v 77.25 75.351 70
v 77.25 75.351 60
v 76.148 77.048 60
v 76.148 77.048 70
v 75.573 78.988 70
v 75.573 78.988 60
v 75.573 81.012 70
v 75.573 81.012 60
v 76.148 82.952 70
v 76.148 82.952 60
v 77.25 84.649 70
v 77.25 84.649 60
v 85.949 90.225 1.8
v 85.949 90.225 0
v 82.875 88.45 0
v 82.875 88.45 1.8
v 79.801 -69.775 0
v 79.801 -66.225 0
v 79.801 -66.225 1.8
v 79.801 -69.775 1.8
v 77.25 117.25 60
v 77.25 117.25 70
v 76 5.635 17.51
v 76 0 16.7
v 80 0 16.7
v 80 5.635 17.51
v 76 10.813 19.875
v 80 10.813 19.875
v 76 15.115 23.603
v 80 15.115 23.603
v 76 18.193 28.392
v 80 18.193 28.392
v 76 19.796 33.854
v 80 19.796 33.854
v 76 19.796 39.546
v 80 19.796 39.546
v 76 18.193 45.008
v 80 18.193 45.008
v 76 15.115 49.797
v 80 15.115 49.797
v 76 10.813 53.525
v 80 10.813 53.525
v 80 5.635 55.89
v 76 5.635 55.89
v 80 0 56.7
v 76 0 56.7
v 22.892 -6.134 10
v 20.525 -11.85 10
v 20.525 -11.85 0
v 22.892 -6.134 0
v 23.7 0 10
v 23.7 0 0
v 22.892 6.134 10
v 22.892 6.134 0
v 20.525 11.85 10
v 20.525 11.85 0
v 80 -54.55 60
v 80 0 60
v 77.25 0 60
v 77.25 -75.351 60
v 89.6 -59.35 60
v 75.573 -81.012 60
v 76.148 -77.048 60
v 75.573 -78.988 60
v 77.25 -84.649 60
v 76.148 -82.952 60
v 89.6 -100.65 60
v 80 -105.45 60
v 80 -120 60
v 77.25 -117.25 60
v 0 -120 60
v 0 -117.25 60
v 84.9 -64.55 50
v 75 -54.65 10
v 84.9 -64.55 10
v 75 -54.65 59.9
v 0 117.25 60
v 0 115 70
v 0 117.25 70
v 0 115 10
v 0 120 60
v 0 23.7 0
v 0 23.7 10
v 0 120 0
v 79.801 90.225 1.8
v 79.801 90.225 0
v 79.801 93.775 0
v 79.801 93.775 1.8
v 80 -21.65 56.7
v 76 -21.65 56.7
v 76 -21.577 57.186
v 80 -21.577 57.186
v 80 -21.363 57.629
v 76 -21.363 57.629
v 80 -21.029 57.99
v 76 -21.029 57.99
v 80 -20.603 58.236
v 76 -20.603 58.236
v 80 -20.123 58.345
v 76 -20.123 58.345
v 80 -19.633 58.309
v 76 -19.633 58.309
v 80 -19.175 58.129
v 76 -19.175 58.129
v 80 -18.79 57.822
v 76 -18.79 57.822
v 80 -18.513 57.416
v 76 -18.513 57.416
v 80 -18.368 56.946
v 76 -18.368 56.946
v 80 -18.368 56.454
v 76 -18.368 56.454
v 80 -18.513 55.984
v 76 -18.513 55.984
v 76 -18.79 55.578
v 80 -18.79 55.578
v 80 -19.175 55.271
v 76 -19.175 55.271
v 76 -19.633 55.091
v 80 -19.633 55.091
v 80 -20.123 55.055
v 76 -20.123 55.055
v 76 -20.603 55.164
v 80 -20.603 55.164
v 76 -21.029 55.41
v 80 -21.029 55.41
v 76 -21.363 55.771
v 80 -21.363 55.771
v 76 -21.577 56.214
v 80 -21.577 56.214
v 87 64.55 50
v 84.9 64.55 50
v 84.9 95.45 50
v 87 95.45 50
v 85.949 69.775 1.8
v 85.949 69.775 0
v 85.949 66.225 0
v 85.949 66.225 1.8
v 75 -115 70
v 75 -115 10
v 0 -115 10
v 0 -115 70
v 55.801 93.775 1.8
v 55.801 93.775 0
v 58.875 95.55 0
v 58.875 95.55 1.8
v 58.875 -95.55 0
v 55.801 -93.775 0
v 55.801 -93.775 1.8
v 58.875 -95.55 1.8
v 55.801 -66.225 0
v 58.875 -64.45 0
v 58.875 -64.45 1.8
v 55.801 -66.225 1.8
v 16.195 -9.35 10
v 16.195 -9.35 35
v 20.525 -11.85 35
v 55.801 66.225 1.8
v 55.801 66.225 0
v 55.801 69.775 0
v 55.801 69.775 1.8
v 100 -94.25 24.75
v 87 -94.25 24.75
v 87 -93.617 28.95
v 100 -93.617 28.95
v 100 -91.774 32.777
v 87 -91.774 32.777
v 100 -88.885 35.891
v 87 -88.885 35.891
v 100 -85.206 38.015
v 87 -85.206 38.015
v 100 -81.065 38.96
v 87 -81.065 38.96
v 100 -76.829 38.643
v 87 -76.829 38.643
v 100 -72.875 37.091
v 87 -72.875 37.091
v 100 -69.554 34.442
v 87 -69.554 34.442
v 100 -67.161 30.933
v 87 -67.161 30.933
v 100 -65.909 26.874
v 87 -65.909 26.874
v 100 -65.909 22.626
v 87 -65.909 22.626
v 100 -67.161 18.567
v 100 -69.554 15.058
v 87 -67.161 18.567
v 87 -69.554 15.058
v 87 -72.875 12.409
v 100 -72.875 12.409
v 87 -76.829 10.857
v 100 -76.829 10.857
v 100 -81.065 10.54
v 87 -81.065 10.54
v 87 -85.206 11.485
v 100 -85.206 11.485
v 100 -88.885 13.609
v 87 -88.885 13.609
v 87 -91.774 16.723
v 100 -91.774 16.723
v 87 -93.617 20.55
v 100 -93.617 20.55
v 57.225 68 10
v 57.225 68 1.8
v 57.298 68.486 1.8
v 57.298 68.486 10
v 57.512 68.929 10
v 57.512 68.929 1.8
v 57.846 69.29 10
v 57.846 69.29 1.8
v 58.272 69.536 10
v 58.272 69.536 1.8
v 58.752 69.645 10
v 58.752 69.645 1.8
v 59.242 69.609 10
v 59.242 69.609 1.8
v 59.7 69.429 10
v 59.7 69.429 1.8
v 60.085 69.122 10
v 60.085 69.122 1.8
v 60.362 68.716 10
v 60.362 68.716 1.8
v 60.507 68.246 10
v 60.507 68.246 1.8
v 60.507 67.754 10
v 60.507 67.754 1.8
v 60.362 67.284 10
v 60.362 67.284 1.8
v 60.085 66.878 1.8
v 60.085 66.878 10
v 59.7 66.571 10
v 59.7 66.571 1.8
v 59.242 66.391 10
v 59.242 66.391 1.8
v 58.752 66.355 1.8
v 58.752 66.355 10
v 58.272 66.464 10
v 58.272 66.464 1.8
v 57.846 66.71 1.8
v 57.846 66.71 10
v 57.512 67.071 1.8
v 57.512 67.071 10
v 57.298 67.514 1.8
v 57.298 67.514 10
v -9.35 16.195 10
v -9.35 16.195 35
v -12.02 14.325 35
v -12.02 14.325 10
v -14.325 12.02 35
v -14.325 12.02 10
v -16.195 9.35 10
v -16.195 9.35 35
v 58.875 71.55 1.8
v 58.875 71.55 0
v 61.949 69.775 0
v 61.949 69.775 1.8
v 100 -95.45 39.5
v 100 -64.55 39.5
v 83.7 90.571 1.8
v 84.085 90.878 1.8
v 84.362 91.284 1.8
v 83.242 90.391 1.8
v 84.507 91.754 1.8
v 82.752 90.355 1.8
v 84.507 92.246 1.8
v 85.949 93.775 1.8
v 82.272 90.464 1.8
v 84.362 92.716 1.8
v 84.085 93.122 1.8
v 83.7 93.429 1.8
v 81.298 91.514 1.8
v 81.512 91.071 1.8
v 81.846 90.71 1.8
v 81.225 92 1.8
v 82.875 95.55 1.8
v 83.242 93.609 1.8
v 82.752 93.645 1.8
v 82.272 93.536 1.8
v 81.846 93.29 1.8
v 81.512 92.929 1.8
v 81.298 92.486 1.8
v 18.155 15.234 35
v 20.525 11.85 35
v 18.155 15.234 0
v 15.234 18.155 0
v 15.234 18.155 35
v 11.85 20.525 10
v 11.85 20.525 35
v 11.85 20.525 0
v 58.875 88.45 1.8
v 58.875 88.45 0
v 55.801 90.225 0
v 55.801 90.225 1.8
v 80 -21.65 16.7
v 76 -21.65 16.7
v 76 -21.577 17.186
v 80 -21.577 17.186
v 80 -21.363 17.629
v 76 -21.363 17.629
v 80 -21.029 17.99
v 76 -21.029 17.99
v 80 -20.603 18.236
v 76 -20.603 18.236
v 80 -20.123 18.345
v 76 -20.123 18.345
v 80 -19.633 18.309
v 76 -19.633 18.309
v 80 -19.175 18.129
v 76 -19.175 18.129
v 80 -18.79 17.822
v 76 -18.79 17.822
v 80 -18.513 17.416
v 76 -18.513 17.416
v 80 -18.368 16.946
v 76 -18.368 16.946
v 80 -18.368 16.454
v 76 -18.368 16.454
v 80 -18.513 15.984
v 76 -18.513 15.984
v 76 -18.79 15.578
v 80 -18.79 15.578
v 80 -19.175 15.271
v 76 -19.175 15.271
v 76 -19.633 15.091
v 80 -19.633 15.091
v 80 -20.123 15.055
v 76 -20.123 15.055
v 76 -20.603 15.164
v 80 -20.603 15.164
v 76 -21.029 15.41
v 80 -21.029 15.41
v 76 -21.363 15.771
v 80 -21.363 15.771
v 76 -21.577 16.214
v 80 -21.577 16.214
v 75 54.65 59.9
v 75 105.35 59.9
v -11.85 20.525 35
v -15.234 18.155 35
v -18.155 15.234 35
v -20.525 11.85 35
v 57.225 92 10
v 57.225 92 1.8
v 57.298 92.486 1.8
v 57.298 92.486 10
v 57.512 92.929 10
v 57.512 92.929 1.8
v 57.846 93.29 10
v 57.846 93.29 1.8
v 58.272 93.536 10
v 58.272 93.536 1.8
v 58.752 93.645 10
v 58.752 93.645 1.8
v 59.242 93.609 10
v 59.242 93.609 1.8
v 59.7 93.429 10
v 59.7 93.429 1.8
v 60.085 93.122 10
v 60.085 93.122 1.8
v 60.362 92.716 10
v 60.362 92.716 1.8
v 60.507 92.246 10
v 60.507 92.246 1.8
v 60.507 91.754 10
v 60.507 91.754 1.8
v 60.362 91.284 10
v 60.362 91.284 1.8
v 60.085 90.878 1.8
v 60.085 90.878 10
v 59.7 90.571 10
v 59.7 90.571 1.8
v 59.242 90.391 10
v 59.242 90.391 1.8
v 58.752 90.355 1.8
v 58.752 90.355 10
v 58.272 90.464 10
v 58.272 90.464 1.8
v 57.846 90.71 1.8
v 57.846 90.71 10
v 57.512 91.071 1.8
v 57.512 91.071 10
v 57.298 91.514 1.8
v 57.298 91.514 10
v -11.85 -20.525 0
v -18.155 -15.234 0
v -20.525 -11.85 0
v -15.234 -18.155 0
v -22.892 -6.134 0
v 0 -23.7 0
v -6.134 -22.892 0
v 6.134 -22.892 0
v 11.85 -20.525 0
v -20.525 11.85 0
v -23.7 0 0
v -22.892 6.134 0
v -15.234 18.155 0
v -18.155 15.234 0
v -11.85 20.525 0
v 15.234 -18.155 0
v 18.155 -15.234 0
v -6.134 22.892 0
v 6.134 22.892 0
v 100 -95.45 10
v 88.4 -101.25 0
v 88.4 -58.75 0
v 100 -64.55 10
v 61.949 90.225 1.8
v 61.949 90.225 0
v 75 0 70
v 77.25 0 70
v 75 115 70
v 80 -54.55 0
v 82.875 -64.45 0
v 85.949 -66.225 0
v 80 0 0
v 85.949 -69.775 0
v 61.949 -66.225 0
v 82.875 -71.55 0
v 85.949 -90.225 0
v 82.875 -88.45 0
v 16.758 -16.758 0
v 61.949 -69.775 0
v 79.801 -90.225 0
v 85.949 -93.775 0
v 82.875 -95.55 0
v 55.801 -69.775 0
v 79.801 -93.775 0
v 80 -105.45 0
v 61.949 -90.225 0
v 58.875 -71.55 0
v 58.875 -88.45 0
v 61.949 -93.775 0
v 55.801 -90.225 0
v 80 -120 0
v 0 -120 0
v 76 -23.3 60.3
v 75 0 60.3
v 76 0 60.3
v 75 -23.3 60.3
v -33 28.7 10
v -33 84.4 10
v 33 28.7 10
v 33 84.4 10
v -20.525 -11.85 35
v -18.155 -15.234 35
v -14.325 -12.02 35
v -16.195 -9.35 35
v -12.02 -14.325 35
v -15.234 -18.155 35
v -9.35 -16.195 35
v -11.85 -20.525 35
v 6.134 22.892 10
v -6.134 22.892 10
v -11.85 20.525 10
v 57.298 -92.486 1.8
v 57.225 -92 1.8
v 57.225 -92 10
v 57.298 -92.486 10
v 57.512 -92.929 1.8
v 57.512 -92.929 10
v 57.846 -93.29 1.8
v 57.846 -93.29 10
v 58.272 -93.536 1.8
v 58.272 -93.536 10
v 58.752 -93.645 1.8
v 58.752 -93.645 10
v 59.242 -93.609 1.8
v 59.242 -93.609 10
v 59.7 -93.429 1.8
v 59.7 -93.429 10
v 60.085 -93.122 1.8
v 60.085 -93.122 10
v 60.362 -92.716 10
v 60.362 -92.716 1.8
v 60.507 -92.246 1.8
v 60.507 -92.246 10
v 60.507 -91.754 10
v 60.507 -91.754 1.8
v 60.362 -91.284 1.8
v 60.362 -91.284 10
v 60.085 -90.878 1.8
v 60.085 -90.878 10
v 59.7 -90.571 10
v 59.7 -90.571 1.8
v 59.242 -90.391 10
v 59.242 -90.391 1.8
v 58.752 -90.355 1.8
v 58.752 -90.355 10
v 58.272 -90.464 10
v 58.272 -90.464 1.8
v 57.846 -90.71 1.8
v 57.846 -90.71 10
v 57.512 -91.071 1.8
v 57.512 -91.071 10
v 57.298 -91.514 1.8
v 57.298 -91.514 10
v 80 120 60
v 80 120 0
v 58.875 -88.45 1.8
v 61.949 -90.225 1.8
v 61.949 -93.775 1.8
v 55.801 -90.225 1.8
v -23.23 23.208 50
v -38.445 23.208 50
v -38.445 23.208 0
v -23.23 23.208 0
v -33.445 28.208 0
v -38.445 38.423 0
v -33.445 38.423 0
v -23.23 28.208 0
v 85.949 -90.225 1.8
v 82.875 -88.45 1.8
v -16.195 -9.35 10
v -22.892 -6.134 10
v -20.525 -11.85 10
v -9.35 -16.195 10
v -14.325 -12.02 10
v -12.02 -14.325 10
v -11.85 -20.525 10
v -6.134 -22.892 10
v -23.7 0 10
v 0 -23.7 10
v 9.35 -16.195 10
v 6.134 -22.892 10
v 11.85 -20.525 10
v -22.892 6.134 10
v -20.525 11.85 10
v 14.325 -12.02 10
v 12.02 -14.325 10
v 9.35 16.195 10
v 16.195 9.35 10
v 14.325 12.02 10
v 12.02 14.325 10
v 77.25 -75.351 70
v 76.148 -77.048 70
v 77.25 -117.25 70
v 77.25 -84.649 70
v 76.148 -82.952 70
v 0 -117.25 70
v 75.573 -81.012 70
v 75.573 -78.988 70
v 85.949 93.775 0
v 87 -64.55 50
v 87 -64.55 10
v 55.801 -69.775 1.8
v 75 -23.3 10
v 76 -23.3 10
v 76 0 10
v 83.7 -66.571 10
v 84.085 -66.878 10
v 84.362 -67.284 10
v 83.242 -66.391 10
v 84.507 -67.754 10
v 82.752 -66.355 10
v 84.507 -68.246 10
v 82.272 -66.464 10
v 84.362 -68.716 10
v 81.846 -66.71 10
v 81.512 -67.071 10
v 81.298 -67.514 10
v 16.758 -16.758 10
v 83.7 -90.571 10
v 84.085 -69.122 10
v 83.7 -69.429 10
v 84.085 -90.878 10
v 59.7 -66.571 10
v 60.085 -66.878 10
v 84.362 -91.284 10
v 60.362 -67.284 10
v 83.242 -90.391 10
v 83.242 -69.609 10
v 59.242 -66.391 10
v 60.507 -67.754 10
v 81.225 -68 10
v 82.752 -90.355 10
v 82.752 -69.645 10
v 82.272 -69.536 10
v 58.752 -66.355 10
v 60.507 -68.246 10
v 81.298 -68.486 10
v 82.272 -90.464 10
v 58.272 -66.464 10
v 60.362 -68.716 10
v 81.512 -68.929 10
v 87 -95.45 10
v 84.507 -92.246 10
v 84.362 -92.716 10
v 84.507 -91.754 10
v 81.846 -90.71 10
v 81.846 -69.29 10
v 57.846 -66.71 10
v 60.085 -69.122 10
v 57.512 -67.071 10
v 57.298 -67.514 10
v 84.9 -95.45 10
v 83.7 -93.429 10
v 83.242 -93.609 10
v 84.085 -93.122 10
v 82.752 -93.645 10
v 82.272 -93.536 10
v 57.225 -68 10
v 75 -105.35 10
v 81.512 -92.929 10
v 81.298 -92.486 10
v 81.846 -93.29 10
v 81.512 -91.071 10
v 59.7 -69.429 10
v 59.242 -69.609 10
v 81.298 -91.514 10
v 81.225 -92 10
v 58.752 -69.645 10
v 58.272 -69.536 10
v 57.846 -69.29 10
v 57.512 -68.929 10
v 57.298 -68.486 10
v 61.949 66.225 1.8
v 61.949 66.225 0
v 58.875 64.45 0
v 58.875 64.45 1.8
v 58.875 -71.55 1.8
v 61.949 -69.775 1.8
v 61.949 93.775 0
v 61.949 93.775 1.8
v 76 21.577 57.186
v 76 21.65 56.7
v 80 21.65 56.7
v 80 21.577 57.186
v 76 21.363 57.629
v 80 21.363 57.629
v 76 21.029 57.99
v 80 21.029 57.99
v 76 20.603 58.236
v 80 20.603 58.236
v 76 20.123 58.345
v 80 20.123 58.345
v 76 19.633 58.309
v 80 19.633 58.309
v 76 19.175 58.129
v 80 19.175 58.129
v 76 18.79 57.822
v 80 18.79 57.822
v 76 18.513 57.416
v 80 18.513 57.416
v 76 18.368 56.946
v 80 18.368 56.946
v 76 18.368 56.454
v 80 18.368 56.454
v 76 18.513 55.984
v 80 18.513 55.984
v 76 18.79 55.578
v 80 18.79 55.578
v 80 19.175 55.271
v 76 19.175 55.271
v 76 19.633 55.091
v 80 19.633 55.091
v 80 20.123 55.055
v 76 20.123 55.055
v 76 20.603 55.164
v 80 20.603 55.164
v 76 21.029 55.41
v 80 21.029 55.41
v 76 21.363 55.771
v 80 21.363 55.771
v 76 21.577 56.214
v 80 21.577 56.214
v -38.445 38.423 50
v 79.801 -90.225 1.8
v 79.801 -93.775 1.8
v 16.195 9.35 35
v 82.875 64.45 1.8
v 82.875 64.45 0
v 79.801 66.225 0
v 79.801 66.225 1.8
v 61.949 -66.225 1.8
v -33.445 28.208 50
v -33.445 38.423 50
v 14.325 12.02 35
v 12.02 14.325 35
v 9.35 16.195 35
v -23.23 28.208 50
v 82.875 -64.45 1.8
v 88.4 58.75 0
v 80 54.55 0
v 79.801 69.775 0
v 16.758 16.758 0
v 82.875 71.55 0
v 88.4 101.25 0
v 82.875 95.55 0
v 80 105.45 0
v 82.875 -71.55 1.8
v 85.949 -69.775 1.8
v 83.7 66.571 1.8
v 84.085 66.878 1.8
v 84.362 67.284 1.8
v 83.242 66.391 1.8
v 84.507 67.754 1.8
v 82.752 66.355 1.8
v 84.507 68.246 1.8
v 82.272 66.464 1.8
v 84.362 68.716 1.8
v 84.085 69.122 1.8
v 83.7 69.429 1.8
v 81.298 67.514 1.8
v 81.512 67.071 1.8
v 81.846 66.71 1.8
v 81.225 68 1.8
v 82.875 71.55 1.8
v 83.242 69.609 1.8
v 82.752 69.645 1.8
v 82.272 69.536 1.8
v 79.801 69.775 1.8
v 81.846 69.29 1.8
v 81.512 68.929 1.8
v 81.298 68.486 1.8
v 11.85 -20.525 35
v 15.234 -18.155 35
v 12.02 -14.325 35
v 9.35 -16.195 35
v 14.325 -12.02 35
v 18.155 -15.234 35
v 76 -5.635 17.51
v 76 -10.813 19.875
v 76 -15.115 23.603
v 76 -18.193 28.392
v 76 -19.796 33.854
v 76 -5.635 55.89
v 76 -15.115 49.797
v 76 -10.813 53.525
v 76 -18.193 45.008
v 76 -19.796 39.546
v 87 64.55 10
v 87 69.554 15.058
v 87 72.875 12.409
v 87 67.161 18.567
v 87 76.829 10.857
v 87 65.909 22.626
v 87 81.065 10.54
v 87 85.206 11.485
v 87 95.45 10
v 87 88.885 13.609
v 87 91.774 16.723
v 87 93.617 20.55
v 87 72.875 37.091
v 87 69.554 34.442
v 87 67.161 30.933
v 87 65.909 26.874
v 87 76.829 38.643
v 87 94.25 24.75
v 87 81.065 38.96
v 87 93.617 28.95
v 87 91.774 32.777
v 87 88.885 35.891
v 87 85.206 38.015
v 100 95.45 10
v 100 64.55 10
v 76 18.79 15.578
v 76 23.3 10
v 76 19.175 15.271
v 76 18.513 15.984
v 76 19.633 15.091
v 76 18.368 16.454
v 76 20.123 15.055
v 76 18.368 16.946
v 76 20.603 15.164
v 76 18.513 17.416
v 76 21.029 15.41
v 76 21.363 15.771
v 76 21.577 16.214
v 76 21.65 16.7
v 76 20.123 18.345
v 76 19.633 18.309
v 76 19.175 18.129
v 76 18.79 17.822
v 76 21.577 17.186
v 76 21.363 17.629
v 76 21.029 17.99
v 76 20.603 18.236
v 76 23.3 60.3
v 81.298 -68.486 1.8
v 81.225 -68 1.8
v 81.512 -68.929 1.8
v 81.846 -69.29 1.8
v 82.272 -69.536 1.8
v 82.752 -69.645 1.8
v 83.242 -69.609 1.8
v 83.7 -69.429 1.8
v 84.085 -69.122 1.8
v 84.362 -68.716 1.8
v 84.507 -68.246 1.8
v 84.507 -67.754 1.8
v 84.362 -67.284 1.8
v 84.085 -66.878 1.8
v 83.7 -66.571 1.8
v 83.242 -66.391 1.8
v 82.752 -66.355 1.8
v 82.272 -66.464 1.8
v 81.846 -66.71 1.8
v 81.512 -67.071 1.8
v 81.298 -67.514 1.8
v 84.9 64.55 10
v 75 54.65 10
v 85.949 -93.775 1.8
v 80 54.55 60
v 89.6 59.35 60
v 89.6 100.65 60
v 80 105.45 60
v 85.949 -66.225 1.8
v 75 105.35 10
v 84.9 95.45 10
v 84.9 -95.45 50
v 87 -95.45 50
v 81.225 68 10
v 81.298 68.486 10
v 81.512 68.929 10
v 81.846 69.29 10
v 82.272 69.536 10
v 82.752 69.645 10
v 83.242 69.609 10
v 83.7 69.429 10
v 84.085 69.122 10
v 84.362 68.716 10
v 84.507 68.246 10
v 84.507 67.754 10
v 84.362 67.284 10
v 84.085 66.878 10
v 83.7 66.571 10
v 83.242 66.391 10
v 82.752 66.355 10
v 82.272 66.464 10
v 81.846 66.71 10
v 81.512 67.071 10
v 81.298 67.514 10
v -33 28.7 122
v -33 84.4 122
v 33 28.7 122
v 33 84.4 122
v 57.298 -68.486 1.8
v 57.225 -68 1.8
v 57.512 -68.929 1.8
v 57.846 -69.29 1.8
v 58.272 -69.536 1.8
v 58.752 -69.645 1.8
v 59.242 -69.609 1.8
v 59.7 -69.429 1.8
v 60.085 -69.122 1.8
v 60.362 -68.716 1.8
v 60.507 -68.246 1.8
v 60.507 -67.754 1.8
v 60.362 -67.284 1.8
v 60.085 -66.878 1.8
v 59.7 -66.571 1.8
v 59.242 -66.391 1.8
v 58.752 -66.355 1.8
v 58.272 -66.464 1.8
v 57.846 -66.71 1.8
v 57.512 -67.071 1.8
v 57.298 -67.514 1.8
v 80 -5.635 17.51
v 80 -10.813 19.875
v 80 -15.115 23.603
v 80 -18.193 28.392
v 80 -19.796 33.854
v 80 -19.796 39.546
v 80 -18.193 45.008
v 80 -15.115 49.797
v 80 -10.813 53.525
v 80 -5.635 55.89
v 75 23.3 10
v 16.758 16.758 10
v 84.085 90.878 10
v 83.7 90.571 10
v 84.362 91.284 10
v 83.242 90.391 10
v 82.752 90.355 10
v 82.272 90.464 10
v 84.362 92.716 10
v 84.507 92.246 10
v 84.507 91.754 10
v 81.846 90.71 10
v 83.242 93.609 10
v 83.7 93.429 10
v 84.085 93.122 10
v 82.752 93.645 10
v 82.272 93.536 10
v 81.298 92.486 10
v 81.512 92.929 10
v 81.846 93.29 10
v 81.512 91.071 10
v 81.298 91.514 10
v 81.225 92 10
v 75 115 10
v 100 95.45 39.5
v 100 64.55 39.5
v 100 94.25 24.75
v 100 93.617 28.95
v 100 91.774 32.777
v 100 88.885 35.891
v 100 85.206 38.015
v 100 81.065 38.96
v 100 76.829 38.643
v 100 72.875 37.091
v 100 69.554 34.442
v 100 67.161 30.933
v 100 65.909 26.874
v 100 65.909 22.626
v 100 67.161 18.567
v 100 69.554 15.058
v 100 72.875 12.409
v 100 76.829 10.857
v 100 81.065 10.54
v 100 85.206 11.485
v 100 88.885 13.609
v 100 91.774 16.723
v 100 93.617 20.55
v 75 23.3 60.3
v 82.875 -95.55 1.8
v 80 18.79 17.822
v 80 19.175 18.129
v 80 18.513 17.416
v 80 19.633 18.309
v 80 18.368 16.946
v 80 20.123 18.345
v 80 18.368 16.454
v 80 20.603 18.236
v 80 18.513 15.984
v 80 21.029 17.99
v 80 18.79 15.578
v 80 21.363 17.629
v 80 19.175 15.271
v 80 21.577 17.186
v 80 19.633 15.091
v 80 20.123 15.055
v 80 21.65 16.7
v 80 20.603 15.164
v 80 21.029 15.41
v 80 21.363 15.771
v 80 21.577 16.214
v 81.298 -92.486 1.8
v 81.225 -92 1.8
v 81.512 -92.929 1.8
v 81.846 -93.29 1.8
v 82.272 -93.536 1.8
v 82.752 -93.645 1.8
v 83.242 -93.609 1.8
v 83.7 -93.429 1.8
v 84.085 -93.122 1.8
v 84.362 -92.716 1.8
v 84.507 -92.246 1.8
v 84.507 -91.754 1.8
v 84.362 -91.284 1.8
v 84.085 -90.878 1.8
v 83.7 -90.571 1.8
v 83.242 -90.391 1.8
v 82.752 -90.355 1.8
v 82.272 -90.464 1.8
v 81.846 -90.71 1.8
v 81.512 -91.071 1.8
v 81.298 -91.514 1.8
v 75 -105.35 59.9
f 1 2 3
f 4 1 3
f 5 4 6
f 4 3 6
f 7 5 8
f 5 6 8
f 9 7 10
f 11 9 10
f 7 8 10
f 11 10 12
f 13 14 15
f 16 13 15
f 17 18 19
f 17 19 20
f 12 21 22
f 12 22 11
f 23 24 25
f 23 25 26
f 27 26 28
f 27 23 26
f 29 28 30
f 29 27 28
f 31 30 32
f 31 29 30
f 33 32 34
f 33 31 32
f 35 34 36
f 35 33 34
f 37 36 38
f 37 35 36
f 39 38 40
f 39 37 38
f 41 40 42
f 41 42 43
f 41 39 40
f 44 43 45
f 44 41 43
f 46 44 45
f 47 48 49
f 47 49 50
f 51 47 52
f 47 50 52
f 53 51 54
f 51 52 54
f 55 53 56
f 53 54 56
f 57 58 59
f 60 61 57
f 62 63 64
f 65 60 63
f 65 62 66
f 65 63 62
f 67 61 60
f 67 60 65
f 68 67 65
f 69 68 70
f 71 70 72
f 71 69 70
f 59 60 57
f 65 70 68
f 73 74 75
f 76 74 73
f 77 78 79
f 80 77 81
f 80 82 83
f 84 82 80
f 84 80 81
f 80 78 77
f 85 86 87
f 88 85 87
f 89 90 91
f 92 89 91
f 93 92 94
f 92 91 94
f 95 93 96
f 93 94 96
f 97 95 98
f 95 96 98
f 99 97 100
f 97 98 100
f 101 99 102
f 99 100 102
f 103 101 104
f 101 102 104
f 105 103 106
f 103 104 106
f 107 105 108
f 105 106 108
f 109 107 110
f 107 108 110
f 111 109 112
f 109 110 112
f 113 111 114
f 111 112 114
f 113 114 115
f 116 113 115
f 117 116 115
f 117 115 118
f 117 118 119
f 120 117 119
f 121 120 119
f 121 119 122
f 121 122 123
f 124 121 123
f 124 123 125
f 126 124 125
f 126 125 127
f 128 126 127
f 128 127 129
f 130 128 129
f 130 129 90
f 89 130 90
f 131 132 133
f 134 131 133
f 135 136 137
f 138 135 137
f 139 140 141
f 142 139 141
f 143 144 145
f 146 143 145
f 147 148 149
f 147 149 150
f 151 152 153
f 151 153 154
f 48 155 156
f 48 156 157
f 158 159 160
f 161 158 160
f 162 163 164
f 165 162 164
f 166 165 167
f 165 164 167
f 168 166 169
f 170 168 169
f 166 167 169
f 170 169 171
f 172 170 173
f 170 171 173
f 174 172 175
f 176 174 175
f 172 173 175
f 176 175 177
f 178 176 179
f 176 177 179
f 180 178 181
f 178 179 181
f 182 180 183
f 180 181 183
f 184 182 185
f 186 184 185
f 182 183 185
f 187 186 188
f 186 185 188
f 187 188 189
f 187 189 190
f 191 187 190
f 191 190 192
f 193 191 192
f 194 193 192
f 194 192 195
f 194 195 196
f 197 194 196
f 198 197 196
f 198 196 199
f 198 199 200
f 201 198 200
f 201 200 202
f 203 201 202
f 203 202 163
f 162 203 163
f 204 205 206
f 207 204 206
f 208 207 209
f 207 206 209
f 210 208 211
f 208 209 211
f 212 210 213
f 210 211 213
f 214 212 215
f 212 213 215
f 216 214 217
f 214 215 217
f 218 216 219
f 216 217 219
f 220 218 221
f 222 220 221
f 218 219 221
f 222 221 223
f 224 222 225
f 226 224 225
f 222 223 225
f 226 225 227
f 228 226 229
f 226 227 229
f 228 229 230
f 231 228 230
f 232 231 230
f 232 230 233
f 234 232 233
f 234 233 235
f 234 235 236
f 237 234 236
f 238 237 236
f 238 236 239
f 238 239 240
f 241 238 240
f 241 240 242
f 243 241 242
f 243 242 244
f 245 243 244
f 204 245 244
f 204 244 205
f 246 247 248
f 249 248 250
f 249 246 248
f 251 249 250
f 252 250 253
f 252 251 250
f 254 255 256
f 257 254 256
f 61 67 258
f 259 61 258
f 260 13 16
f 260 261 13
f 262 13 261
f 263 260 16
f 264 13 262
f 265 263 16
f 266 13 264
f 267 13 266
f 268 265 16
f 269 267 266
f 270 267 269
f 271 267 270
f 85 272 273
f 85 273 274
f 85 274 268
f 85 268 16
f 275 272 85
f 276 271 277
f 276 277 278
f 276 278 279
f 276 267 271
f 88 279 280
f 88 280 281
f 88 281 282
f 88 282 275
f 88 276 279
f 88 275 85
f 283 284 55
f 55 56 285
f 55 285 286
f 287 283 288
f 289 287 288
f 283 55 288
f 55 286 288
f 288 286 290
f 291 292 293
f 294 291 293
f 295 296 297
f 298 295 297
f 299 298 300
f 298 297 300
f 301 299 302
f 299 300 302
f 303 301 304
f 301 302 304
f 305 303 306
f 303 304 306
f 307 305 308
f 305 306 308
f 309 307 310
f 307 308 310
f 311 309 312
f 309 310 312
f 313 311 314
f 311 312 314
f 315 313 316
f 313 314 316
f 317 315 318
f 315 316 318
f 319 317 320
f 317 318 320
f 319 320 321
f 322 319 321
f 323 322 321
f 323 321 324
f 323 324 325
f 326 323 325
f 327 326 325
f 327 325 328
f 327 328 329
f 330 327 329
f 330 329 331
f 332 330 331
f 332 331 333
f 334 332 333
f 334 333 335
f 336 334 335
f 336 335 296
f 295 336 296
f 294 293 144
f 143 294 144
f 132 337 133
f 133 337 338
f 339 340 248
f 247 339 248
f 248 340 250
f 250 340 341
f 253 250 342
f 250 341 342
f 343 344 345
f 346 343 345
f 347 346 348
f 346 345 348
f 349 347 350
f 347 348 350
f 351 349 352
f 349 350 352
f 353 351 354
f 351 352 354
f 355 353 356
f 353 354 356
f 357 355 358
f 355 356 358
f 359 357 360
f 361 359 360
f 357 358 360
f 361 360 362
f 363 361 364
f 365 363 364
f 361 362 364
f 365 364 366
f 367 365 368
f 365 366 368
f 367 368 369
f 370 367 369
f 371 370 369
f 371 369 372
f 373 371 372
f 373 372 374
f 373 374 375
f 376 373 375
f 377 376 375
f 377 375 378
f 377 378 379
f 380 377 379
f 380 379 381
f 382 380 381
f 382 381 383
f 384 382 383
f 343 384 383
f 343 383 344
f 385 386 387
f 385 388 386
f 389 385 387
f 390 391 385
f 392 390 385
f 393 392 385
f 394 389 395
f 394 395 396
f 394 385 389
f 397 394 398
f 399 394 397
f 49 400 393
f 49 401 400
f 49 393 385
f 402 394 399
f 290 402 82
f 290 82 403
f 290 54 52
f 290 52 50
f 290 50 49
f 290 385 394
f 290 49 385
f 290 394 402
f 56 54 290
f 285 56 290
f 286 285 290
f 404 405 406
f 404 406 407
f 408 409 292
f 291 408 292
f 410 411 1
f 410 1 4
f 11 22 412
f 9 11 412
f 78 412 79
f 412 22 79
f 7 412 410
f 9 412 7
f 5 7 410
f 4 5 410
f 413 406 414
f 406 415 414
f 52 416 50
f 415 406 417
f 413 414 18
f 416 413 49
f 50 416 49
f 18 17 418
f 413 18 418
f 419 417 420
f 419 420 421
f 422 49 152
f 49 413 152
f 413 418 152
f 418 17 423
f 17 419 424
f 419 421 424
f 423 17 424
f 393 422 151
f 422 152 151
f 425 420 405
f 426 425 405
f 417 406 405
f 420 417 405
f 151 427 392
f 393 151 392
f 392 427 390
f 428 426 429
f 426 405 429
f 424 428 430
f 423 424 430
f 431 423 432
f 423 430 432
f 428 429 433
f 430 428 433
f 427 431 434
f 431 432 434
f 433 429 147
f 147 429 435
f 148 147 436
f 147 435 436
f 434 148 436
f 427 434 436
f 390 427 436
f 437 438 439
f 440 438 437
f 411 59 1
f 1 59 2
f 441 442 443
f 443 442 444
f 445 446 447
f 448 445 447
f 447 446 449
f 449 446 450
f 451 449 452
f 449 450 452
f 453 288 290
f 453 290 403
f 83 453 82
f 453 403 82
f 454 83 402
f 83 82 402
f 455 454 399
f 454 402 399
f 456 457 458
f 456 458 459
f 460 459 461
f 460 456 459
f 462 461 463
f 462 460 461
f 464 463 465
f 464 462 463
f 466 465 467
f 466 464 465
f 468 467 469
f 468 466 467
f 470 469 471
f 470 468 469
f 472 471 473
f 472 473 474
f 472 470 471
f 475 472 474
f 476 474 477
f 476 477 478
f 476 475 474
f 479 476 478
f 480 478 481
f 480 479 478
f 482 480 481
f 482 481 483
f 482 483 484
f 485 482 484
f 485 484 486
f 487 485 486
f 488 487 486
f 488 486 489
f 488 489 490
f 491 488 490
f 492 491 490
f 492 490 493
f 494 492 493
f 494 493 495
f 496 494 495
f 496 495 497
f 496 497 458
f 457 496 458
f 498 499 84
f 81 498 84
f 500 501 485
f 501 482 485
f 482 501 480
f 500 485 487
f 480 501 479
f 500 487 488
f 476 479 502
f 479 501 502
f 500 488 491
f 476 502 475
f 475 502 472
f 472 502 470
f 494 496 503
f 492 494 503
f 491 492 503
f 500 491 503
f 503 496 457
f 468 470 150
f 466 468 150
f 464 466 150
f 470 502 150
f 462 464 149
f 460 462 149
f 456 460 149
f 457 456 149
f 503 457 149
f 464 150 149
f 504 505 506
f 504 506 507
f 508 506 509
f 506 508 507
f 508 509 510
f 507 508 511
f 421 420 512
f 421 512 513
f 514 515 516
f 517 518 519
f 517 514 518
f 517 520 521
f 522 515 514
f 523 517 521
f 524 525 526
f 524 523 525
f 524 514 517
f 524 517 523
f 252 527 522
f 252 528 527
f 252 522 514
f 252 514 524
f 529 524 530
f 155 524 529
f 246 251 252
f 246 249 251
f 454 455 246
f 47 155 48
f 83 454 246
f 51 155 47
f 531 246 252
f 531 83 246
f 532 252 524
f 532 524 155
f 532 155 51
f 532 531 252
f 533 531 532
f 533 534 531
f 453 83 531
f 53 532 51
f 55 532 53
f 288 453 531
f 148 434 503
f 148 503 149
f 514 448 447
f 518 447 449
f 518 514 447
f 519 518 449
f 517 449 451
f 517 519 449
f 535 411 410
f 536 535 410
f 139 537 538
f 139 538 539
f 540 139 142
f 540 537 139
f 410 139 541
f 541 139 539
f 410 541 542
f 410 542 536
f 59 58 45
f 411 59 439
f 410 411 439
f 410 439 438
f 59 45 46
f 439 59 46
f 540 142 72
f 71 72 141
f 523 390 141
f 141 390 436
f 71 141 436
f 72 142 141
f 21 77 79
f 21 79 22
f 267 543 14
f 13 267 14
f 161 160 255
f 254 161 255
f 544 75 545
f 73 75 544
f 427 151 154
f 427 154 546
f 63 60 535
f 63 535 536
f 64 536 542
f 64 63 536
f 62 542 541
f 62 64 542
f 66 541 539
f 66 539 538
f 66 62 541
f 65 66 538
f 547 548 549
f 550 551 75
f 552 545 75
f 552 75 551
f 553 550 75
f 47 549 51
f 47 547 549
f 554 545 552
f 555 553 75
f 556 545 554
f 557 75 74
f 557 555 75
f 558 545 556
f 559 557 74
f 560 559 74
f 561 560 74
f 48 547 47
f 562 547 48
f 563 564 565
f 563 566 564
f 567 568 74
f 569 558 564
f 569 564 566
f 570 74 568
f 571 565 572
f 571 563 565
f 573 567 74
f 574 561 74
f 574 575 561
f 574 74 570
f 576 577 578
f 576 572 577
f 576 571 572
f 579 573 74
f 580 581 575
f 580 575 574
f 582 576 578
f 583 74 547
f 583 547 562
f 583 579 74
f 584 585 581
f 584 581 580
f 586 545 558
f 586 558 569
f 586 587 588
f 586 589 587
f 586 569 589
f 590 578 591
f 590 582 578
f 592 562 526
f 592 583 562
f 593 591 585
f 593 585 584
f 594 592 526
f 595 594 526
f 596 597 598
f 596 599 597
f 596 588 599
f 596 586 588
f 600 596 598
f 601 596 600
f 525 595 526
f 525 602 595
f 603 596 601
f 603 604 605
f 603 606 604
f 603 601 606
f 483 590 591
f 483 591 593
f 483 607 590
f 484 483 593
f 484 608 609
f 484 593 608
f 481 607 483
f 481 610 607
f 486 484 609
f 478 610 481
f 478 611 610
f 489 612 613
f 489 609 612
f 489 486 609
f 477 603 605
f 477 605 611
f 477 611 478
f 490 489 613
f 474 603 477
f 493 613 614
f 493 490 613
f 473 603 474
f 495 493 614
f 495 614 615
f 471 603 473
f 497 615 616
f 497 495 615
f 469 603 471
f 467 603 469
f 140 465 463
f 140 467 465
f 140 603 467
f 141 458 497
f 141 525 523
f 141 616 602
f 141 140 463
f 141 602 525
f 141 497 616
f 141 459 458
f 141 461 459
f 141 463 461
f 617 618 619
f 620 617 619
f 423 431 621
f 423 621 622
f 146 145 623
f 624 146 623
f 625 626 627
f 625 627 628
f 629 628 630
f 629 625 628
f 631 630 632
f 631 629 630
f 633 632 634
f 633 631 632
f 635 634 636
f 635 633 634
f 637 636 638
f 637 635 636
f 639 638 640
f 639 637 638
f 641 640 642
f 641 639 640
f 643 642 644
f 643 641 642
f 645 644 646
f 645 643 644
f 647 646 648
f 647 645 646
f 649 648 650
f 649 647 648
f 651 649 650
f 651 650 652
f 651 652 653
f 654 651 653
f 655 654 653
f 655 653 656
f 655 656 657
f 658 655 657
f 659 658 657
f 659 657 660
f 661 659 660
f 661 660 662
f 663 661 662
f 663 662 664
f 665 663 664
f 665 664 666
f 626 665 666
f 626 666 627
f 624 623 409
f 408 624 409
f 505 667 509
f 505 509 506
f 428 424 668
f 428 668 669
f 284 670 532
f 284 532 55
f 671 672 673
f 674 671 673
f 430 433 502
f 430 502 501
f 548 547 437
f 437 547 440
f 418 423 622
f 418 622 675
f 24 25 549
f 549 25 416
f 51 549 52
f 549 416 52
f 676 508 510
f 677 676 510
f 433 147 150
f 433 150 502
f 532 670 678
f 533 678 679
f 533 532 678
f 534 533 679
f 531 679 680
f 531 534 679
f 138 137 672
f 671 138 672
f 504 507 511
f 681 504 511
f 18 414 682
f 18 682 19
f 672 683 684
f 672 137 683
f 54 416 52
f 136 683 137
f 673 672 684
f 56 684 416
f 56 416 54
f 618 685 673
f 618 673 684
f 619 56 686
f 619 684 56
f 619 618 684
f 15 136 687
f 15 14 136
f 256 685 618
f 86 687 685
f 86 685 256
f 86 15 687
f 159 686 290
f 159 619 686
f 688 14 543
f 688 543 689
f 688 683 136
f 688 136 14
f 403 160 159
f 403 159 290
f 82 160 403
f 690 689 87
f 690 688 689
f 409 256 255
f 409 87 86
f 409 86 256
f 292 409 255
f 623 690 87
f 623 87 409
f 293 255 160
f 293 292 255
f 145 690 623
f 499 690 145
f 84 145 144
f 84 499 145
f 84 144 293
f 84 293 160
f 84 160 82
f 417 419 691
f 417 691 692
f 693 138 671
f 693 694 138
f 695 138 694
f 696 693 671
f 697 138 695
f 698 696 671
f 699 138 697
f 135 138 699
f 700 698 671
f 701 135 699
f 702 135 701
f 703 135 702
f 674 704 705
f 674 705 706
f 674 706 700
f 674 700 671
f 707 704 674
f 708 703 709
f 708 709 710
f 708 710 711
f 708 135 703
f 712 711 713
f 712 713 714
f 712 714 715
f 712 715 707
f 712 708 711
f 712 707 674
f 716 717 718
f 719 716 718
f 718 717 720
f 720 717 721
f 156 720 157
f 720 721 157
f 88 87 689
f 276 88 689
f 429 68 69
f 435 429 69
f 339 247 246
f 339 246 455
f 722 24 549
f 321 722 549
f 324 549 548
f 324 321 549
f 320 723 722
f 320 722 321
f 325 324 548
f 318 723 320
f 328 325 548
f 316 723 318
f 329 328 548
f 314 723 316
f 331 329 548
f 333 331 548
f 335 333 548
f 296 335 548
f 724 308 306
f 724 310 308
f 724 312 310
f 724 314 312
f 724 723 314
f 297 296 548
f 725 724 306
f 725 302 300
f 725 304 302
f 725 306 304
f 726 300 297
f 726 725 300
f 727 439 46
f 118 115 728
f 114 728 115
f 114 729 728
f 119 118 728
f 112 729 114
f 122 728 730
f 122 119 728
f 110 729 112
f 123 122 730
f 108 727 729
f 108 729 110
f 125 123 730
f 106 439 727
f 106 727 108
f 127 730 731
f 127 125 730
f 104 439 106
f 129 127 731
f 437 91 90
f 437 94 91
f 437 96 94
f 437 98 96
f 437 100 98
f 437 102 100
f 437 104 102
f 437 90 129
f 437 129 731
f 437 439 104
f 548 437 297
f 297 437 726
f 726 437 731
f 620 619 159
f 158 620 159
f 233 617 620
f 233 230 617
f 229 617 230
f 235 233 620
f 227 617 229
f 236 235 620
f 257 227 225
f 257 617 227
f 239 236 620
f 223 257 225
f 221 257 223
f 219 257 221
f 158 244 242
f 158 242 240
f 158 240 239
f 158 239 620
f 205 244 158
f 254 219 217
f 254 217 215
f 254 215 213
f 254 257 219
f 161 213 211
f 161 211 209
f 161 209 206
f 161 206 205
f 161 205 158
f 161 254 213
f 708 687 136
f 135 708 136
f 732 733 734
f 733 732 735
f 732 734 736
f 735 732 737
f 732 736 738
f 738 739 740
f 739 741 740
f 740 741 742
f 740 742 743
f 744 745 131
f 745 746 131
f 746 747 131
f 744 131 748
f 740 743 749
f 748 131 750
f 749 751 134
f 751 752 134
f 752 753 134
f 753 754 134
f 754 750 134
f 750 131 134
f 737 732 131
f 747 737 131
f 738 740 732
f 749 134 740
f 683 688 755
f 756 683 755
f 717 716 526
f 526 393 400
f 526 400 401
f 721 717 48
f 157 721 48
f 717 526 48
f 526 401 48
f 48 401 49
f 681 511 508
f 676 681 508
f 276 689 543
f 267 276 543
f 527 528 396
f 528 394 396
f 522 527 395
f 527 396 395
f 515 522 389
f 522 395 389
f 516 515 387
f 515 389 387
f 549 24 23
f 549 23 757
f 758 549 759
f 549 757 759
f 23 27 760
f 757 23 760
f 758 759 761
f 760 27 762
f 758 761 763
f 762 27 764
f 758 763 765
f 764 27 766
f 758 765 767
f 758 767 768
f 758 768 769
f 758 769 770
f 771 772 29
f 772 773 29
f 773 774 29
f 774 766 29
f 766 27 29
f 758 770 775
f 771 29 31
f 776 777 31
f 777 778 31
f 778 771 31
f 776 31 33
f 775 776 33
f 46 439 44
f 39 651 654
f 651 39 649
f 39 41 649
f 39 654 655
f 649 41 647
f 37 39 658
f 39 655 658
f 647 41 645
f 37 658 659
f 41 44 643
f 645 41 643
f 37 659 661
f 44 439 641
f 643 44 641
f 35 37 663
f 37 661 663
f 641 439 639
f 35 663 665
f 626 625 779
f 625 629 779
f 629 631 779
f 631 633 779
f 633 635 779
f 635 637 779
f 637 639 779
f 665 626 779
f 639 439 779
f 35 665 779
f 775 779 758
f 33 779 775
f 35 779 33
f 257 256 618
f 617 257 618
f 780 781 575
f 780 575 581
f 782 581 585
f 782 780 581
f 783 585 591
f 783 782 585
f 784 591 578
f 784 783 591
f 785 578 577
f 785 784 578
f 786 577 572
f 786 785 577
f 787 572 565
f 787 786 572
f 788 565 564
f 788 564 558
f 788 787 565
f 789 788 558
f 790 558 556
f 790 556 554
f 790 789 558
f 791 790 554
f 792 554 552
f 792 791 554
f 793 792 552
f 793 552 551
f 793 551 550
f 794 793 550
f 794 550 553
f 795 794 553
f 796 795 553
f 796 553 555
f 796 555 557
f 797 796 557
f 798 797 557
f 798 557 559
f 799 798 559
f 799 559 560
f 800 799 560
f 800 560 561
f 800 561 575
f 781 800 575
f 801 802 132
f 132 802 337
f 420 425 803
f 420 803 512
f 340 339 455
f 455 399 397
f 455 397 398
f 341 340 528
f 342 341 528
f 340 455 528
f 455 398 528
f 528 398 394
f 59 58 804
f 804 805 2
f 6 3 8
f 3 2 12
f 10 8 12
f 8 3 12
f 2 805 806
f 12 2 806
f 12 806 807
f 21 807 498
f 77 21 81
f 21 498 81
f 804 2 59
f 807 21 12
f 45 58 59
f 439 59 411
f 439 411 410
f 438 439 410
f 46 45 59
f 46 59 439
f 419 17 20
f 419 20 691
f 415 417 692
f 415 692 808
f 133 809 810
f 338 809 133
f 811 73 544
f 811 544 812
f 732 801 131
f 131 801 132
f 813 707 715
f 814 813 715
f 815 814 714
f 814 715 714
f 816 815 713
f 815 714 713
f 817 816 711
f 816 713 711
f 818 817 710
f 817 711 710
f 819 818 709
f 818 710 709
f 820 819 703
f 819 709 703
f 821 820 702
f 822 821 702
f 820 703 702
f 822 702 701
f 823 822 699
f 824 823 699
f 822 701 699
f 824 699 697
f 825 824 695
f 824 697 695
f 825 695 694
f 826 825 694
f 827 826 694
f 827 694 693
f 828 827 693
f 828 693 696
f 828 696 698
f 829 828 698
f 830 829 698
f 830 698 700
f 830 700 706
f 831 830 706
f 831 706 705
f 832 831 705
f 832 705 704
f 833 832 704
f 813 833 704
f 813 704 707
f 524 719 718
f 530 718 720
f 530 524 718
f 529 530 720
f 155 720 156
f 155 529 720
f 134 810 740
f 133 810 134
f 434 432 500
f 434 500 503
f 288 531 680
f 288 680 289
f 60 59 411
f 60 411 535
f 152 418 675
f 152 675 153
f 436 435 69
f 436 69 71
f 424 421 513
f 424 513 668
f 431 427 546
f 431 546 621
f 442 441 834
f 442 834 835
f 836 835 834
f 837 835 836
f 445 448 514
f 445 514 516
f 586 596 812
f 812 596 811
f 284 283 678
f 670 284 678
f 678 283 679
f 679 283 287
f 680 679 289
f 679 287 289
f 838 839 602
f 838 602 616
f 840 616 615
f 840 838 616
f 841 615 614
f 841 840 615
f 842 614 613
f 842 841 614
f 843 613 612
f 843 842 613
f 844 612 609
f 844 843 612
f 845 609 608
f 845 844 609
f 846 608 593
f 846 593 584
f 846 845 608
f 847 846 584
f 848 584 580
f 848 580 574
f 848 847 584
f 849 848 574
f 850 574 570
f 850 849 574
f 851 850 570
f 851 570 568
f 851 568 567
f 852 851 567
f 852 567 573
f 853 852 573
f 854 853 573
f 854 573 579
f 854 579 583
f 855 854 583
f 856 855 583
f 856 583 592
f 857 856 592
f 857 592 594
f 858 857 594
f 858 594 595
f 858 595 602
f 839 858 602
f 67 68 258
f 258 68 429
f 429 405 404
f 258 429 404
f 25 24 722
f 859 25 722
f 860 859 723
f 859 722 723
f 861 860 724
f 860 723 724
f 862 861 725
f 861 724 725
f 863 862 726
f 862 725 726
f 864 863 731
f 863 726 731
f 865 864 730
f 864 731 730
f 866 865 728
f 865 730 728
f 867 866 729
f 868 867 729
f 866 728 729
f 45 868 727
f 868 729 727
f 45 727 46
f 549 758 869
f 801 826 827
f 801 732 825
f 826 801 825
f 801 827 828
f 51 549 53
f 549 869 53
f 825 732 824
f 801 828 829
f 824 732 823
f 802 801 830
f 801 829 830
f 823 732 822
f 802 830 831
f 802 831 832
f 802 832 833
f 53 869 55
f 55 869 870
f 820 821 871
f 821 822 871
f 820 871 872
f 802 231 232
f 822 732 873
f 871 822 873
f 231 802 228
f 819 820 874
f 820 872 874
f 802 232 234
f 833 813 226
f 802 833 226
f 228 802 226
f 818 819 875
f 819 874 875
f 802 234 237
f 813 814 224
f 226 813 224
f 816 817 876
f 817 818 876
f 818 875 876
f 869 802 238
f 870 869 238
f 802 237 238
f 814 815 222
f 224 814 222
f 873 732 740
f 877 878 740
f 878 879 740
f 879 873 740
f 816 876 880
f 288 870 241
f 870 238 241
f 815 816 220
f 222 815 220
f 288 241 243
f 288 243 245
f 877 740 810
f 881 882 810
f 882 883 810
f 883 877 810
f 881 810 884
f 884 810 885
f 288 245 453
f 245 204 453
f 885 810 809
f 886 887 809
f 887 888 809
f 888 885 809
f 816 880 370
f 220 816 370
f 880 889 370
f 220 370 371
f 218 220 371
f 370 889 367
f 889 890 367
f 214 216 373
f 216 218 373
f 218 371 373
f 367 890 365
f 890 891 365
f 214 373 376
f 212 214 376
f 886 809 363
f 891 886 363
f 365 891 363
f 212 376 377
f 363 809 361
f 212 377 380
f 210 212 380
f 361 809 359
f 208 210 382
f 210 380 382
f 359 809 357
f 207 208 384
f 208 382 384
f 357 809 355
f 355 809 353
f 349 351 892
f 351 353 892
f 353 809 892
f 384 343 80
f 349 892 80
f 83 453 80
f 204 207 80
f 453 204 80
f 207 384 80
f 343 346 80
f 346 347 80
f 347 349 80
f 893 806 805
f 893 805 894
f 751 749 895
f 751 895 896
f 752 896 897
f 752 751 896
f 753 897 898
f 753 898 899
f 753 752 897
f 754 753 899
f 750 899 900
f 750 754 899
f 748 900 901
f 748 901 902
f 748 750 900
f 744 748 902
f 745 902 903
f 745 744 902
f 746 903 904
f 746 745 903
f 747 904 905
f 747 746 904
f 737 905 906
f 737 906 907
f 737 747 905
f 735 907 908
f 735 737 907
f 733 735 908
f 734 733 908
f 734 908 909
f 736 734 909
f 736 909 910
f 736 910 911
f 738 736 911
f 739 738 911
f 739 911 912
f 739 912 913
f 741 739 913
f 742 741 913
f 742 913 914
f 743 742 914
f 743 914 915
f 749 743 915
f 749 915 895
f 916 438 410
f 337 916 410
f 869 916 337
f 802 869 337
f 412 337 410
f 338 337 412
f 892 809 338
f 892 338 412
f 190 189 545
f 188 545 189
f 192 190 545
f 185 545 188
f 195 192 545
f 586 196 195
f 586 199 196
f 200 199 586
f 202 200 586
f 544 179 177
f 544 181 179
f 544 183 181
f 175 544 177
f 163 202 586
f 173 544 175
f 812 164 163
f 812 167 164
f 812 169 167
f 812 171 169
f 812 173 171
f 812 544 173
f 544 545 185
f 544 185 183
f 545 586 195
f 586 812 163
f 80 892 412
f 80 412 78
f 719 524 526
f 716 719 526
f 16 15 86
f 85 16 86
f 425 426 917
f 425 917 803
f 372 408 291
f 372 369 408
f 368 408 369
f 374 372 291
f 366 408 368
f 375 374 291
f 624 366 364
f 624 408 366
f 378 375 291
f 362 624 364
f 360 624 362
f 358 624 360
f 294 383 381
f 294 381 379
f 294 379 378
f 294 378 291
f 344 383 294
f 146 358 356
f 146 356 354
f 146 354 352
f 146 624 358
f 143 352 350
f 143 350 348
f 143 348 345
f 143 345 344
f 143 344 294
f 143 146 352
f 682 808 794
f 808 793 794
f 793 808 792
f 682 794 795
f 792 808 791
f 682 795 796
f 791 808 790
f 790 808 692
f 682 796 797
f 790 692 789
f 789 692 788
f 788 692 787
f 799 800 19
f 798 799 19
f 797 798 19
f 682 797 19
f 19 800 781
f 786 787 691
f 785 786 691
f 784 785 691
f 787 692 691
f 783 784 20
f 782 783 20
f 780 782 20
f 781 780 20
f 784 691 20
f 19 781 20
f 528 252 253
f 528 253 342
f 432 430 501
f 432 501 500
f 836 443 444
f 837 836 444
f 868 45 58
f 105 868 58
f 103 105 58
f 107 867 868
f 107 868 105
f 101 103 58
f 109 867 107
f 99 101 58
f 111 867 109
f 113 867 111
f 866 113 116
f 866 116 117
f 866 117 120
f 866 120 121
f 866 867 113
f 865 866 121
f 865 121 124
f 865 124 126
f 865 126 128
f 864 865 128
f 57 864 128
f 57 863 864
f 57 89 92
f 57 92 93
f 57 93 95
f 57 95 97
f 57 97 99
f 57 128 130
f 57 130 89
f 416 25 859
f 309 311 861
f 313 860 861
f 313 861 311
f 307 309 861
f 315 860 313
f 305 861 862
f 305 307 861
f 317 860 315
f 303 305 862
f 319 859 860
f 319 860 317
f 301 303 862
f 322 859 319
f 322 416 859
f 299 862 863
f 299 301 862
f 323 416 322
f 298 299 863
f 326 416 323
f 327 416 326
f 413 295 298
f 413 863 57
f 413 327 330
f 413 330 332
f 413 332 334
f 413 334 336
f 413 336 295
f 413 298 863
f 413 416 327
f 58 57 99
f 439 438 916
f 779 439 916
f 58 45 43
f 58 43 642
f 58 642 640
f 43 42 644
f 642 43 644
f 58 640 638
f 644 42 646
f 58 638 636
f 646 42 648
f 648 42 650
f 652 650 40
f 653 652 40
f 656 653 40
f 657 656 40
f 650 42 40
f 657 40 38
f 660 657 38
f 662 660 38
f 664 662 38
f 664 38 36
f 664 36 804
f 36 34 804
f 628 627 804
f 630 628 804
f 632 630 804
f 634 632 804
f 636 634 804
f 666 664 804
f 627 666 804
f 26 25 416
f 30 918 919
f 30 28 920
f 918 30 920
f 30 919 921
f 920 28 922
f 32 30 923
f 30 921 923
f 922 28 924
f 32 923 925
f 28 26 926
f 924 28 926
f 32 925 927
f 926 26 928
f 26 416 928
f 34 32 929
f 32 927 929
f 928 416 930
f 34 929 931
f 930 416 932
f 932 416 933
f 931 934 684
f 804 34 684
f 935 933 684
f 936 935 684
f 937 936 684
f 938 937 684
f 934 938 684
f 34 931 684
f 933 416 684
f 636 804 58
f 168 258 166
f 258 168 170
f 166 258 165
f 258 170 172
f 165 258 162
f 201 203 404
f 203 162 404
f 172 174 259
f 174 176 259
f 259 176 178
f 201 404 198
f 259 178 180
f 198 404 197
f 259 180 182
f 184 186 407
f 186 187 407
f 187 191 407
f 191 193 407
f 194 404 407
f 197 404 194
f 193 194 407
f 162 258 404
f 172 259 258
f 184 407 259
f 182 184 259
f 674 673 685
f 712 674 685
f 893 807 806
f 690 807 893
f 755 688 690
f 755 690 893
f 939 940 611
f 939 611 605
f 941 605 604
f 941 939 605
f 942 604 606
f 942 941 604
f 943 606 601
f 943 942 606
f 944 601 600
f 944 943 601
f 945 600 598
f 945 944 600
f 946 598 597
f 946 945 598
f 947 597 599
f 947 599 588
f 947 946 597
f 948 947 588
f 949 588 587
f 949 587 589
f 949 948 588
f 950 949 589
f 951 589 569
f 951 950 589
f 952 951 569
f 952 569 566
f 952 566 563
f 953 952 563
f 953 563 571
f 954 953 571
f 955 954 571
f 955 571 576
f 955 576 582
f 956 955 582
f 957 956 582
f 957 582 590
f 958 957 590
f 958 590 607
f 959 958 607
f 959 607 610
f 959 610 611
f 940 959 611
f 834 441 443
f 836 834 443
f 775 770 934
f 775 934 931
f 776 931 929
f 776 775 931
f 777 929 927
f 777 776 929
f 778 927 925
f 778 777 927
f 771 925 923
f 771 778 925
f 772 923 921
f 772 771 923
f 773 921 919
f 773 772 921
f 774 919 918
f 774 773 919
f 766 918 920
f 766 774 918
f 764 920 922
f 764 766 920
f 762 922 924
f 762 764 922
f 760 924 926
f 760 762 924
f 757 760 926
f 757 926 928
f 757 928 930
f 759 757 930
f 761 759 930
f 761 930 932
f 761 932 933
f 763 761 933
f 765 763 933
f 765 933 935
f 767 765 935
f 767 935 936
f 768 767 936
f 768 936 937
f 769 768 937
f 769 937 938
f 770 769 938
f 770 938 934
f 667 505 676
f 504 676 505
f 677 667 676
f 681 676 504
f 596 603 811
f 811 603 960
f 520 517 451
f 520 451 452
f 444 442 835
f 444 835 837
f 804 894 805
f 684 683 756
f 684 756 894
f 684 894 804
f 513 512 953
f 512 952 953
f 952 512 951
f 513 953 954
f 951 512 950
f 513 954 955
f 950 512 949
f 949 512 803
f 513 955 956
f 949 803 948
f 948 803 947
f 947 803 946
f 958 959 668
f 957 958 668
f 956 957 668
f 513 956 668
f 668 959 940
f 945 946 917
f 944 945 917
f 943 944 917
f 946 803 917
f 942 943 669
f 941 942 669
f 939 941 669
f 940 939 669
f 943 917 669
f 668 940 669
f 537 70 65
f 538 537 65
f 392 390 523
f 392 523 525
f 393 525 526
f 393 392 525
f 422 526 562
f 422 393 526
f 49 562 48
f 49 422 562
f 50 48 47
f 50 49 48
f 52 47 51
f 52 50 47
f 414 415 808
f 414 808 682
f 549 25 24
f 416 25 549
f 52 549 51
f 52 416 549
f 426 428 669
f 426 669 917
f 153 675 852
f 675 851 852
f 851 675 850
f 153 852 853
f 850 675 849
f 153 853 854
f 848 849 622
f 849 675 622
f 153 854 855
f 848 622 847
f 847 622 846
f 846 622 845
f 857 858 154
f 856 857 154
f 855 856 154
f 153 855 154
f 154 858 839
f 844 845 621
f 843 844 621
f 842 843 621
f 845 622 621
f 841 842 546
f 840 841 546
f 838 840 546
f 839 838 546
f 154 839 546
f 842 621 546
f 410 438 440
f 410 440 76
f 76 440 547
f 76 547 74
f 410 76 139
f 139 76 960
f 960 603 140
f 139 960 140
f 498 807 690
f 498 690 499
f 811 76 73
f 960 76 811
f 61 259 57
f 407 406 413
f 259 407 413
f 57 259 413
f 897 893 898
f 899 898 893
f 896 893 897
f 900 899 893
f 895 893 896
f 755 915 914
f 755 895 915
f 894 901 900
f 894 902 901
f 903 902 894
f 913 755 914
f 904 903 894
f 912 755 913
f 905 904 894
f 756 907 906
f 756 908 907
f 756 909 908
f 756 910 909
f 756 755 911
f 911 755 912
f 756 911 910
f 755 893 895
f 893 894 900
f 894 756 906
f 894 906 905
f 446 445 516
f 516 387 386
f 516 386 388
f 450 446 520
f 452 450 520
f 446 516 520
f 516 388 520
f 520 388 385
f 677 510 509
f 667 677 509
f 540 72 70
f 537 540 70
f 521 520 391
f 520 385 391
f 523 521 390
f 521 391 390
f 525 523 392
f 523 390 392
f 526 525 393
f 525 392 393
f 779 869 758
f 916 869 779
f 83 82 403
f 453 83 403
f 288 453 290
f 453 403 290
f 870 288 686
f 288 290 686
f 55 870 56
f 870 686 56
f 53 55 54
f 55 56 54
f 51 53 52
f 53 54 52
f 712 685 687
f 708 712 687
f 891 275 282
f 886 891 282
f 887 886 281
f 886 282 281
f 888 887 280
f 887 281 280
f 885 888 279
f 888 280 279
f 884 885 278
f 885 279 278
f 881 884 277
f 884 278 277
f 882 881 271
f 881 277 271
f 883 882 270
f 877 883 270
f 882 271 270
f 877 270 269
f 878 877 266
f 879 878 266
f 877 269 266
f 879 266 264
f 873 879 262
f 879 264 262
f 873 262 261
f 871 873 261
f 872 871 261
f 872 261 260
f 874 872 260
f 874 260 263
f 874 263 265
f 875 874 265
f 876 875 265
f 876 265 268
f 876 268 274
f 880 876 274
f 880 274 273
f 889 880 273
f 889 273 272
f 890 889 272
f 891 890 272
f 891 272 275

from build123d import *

# Parameters (mm, degrees)
SKETCH010_R        = 23.7
PAD003_DEPTH       = 10
PAD002_DEPTH       = 35
POLARPATTERN_COUNT = 4
SKETCH_W           = 80
SKETCH_H           = 120
PAD_DEPTH          = 10
PAD001_DEPTH       = 60
SKETCH003_W        = 30.9
SKETCH003_H        = 40
POCKET_DEPTH       = 12
SKETCH004_R        = 14.25
POCKET001_DEPTH    = 100.001
SKETCH005_R        = 1.65
POCKET002_DEPTH    = 10
POCKET003_DEPTH    = 1.8
POCKET004_DEPTH    = 120.001
SKETCH009_R        = 23.7
POCKET005_DEPTH    = 60.001
PAD004_DEPTH       = 10
SKETCH016_R        = 1.65
POCKET009_DEPTH    = 100.001
SKETCH017_W        = 23.3
SKETCH017_H        = 50.3
POCKET010_DEPTH    = 1
CHAMFER_SIZE       = 9.9
SKETCH018_W        = 66
SKETCH018_H        = 55.7
PAD005_DEPTH       = 112
PAD006_DEPTH       = 50


with BuildPart() as body_grasscutter:
    # Sketch010 → Pad003 (new body)
    with BuildSketch(Plane.XY):
        Circle(SKETCH010_R)
    extrude(amount=PAD003_DEPTH)

    # Sketch008 → Pad002 (join)
    with BuildSketch(Plane.XY):
        with BuildLine():
            ThreePointArc((16.194675, 9.35), (13.222897, 13.222897), (9.35, 16.194675))
            Line((9.35, 16.194675), (11.85, 20.524802))
            ThreePointArc((20.524802, 11.85), (16.758431, 16.758431), (11.85, 20.524802))
            Line((16.194675, 9.35), (20.524802, 11.85))
        make_face()
    pad002 = extrude(amount=PAD002_DEPTH)

    # PolarPattern: Pad002 ×4 about axis
    polarpattern_axis = Axis((0, 0, 0), (0, 0, 1))
    for i in range(1, POLARPATTERN_COUNT):
        add(pad002.rotate(polarpattern_axis, i * 360 / POLARPATTERN_COUNT))


with BuildPart() as body_q11_lower:
    # Sketch → Pad (new body)
    with BuildSketch(Plane.XY):
        with Locations((-40, 60)):
            Rectangle(SKETCH_W, SKETCH_H)
    extrude(amount=PAD_DEPTH)

    # Sketch002 → Pad001 (join)
    with BuildSketch(Plane.XY):
        Polygon((0, 115), (0, 120), (-80, 120), (-80, 105.45), (-100, 95.45), (-100, 64.55), (-80, 54.55), (-80, 0), (-75, 0), (-75, 115), align=None)
    extrude(amount=PAD001_DEPTH)

    # Sketch003 → Pocket (cut)
    with BuildSketch(Plane.YZ.offset(-75)):
        with Locations((80, 30)):
            Rectangle(SKETCH003_W, SKETCH003_H)
    extrude(amount=-POCKET_DEPTH, mode=Mode.SUBTRACT)

    # Sketch004 → Pocket001 (cut, through all)
    with BuildSketch(Plane.YZ):
        with Locations((80, 24.75)):
            Circle(SKETCH004_R)
    extrude(amount=-POCKET001_DEPTH, mode=Mode.SUBTRACT)

    # Sketch005 → Pocket002 (cut)
    with BuildSketch(Plane.XY):
        with Locations((-82.875, 92)):
            Circle(SKETCH005_R)
        with Locations((-58.875, 92)):
            Circle(SKETCH005_R)
        with Locations((-58.875, 68)):
            Circle(SKETCH005_R)
        with Locations((-82.875, 68)):
            Circle(SKETCH005_R)
    extrude(amount=POCKET002_DEPTH, mode=Mode.SUBTRACT)

    # Sketch006 → Pocket003 (cut)
    with BuildSketch(Plane.XY):
        Polygon((-79.80061, 93.775), (-82.875, 95.55), (-85.94939, 93.775), (-85.94939, 90.225), (-82.875, 88.45), (-79.80061, 90.225), align=None)
        Polygon((-55.80061, 93.775), (-58.875, 95.55), (-61.94939, 93.775), (-61.94939, 90.225), (-58.875, 88.45), (-55.80061, 90.225), align=None)
        Polygon((-58.875, 71.55), (-61.94939, 69.775), (-61.94939, 66.225), (-58.875, 64.45), (-55.80061, 66.225), (-55.80061, 69.775), align=None)
        Polygon((-79.80061, 69.775), (-82.875, 71.55), (-85.94939, 69.775), (-85.94939, 66.225), (-82.875, 64.45), (-79.80061, 66.225), align=None)
    extrude(amount=POCKET003_DEPTH, mode=Mode.SUBTRACT)

    # Sketch007 → Pocket004 (cut, through all)
    with BuildSketch(Plane.XZ):
        Polygon((-89.6, 60), (-100, 39.5), (-100, 60), align=None)
        Polygon((-88.4, 0), (-100, 10), (-100, 0), align=None)
    extrude(amount=-POCKET004_DEPTH, mode=Mode.SUBTRACT)

    # Sketch009 → Pocket005 (cut, through all)
    with BuildSketch(Plane.XY):
        Circle(SKETCH009_R)
    extrude(amount=POCKET005_DEPTH, mode=Mode.SUBTRACT)

    # Sketch014 → Pad004 (join)
    with BuildSketch(Plane.XY.offset(60)):
        with BuildLine():
            Line((0, 115), (0, 117.25))
            Line((0, 117.25), (-77.25, 117.25))
            Line((-77.25, 117.25), (-77.25, 84.648925))
            ThreePointArc((-77.25, 75.351075), (-75.5, 80), (-77.25, 84.648925))
            Line((-77.25, 0), (-77.25, 75.351075))
            Line((-77.25, 0), (-75, 0))
            Line((-75, 0), (-75, 115))
            Line((-75, 115), (0, 115))
        make_face()
    extrude(amount=PAD004_DEPTH)

    # Sketch016 → Pocket009 (cut, through all)
    with BuildSketch(Plane.YZ):
        with Locations((20, 56.7)):
            Circle(SKETCH016_R)
        with Locations((20, 16.7)):
            Circle(SKETCH016_R)
        with BuildLine():
            ThreePointArc((0, 16.7), (20, 36.7), (0, 56.7))
            Line((0, 56.7), (0, 16.7))
        make_face()
    extrude(amount=-POCKET009_DEPTH, mode=Mode.SUBTRACT)

    # Sketch017 → Pocket010 (cut)
    with BuildSketch(Plane.YZ.offset(-75)):
        with Locations((11.65, 35.15)):
            Rectangle(SKETCH017_W, SKETCH017_H)
    extrude(amount=-POCKET010_DEPTH, mode=Mode.SUBTRACT)

    # Chamfer
    chamfer_edges = [body_q11_lower.edges().sort_by_distance(p)[0] for p in [
        (-75, 95.45, 30),
        (-75, 80, 50),
        (-75, 64.55, 30),
    ]]
    chamfer(chamfer_edges, length=CHAMFER_SIZE)


with BuildPart() as part_mirroring001:
    # Part__Mirroring001: instance of Body-q11-lower
    add(body_q11_lower.part.mirror(Plane(origin=(0, 0, 0), x_dir=(0, -1, 0), z_dir=(1, 0, 0))))


with BuildPart() as part_mirroring:
    # Part__Mirroring: instance of Body-q11-lower
    add(body_q11_lower.part.mirror(Plane(origin=(-50, 4e-06, 35), x_dir=(1, 0, 0), z_dir=(0, 1, 0))))


with BuildPart() as part_mirroring002:
    # Part__Mirroring002: instance of Part__Mirroring
    add(part_mirroring.part.mirror(Plane(origin=(0, 0, 0), x_dir=(0, -1, 0), z_dir=(1, 0, 0))))


with BuildPart() as body_battery:
    # Sketch018 → Pad005 (new body)
    with BuildSketch(Plane(origin=(0, 28.7, 10), x_dir=(1, 0, 0), z_dir=(0, 0, 1))):
        with Locations((0, 27.85)):
            Rectangle(SKETCH018_W, SKETCH018_H)
    extrude(amount=PAD005_DEPTH)


with BuildPart() as body003:
    # Sketch021 → Pad006 (new body)
    with BuildSketch(Plane.XY):
        Polygon((-38.444878, 38.422511), (-38.444878, 23.207707), (-23.230074, 23.207707), (-23.230074, 28.207707), (-33.444878, 28.207707), (-33.444878, 38.422511), align=None)
    extrude(amount=PAD006_DEPTH)


solid = Compound([body_grasscutter.part, part_mirroring001.part, part_mirroring002.part, body_battery.part, body003.part])
